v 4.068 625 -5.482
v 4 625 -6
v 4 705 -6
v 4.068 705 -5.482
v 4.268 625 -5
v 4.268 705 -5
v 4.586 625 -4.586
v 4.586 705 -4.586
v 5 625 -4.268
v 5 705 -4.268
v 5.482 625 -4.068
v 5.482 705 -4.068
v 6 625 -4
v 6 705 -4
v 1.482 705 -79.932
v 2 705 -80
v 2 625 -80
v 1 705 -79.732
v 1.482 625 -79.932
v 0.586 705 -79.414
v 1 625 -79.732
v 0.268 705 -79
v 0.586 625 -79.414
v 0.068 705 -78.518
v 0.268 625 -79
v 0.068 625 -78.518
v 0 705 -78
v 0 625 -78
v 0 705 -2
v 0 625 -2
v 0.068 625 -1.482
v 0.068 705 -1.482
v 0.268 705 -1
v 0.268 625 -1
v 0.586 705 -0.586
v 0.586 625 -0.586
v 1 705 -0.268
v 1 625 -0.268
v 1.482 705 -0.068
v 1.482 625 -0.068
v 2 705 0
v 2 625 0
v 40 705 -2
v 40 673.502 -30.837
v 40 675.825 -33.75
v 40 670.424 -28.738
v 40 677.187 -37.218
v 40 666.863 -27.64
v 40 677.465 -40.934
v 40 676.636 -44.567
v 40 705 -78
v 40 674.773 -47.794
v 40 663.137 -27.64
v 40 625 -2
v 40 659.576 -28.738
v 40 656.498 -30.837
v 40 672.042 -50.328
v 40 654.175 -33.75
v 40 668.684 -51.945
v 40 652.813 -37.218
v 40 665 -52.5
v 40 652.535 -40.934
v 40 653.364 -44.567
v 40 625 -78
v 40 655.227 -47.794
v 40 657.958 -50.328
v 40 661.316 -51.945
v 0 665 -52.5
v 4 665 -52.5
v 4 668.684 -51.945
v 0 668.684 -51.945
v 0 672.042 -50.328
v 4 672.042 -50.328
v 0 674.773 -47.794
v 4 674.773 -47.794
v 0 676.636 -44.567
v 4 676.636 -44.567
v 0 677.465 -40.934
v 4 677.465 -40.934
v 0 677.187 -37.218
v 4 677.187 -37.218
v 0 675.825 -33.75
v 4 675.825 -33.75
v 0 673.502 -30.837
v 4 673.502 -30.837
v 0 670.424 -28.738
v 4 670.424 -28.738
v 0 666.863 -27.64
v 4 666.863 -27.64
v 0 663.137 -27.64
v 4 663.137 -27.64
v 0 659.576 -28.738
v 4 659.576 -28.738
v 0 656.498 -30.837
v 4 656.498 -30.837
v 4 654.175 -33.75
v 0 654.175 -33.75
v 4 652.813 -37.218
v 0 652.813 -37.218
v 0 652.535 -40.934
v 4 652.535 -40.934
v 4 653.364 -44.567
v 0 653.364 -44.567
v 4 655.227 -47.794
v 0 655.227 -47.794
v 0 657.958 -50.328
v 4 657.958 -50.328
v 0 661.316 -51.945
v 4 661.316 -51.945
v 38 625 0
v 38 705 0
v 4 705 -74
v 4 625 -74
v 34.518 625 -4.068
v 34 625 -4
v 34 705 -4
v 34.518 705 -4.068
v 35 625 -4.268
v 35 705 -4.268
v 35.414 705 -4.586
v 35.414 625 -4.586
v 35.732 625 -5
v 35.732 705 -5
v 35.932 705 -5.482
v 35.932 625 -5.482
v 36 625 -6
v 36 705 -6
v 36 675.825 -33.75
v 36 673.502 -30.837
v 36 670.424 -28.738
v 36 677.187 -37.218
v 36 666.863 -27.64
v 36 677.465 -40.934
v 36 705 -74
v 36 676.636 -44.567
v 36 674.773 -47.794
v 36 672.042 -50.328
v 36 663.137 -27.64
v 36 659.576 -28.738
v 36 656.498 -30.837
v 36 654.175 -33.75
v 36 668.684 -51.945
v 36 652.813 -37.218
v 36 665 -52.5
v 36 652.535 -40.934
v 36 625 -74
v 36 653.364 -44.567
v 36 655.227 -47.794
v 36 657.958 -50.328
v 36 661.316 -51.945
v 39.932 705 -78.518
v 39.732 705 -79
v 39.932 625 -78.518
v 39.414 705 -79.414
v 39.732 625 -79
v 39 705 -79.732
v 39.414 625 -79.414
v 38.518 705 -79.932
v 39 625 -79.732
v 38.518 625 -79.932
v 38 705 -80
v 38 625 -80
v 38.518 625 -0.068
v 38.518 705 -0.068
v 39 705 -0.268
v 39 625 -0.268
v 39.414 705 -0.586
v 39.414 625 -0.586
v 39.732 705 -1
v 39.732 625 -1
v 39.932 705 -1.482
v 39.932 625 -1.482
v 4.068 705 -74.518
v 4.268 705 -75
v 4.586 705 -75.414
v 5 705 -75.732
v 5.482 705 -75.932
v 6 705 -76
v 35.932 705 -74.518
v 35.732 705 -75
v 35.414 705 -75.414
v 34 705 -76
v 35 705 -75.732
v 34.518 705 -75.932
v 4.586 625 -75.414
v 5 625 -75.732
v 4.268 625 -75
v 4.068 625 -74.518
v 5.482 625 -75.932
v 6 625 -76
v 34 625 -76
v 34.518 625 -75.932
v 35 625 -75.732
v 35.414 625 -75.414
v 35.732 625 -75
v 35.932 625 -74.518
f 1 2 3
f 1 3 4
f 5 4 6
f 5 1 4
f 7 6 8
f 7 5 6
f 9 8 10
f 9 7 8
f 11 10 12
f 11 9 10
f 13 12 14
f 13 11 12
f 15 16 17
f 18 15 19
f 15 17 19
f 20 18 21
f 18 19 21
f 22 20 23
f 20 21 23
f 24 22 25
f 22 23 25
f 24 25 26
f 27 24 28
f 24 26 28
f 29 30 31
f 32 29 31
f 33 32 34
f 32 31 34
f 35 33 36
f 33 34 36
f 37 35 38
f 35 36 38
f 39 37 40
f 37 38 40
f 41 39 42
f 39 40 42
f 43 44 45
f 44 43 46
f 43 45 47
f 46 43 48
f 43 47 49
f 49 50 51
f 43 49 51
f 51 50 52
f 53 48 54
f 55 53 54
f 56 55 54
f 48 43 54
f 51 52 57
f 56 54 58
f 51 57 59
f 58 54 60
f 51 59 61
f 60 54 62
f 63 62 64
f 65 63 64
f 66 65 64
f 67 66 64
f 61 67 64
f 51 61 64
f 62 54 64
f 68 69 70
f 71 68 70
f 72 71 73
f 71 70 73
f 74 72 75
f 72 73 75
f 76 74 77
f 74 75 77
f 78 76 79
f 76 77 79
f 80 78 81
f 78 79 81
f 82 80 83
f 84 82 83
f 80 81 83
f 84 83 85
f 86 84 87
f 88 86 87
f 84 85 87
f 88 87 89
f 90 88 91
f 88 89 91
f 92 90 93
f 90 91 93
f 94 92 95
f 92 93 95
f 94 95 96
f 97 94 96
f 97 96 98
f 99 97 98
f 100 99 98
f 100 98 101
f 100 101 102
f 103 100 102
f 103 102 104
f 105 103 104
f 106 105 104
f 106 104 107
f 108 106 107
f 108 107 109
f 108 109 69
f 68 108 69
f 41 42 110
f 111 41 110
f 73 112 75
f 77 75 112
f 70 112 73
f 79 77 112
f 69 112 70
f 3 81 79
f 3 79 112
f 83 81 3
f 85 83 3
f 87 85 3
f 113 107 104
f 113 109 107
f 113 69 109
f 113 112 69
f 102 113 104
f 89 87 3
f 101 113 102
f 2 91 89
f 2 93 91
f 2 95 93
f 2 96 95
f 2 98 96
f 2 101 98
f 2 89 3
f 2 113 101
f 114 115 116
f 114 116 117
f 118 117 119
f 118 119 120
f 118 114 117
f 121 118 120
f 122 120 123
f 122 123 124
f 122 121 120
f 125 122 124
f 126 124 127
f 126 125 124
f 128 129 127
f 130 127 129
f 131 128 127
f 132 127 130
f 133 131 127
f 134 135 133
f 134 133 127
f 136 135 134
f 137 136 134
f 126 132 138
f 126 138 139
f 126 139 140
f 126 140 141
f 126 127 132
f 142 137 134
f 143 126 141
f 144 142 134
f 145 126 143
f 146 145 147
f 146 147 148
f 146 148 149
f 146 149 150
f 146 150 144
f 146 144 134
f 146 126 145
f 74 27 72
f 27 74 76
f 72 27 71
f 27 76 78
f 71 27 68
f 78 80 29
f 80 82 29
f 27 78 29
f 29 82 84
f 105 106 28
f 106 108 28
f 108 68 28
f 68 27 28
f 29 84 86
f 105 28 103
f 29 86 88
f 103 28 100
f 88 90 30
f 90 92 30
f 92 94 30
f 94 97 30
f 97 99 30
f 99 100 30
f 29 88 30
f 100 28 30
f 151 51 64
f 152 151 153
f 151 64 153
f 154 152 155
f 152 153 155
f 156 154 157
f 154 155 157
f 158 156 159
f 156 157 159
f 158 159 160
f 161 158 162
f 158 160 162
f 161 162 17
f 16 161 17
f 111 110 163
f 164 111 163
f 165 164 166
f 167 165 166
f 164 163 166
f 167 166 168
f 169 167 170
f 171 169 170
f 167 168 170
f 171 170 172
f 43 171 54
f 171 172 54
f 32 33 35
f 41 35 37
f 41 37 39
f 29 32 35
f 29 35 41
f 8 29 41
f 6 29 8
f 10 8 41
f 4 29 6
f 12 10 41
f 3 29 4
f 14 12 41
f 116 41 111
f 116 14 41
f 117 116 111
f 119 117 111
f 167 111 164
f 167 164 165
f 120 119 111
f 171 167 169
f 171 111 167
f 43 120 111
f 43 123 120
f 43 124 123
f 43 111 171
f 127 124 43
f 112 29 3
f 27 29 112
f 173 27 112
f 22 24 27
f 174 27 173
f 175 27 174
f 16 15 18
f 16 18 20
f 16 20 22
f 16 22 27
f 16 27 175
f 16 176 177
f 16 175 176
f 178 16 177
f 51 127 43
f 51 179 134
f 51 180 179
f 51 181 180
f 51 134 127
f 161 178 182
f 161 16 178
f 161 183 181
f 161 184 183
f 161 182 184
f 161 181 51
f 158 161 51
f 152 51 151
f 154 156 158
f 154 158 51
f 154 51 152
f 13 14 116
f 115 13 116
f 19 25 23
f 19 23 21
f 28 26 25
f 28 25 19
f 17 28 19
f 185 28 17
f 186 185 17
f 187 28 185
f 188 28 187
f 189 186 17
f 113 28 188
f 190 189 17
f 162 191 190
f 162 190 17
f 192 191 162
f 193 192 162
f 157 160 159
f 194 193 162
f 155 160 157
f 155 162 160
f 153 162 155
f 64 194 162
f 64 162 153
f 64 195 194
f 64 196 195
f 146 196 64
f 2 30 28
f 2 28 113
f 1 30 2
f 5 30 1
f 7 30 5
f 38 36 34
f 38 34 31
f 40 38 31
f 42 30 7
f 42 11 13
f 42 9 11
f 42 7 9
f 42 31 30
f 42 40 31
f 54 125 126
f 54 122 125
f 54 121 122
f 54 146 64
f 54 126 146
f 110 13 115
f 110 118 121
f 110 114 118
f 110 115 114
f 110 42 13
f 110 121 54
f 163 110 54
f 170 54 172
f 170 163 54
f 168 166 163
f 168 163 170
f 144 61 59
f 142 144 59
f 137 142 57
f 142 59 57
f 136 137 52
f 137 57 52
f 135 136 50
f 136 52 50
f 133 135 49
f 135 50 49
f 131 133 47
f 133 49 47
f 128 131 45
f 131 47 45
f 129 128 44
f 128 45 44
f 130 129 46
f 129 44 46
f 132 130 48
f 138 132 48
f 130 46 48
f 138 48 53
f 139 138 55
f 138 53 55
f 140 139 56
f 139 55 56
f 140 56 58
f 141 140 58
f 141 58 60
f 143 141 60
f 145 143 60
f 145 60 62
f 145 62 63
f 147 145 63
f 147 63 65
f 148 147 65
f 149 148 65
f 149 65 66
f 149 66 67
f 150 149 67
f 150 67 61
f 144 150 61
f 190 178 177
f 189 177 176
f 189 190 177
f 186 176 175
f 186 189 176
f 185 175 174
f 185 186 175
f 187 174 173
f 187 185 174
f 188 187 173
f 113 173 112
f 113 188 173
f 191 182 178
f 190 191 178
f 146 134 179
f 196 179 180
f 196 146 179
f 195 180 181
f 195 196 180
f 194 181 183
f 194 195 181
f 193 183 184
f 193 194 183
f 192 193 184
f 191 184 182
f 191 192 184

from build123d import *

# Parameters (mm, degrees)
BOSS_EXTRU_1_DEPTH      = 705
ESQUISSE3_R             = 10.125
ESQUISSE3_R_2           = 12.5
ENL_V_MAT_EXTRU_1_DEPTH = 711.651109899
ESQUISSE4_W             = 618.270478043
ESQUISSE4_H             = 899.840554594
ESQUISSE4_W_2           = 40
ESQUISSE4_H_2           = 80
ENL_V_MAT_EXTRU_2_DEPTH = 711.651109899


with BuildPart() as part:
    # Esquisse2 → Boss.-Extru.1 (new body)
    with BuildSketch(Plane(origin=(0, 0, 0), x_dir=(1, 0, 0), z_dir=(0, 1, 0))):
        with BuildLine():
            Line((2, 0), (38, 0))
            ThreePointArc((38, 0), (39.414213562, 0.585786438), (40, 2))
            Line((40, 2), (40, 78))
            ThreePointArc((40, 78), (39.414213562, 79.414213562), (38, 80))
            Line((38, 80), (2, 80))
            ThreePointArc((2, 80), (0.585786438, 79.414213562), (0, 78))
            Line((0, 78), (0, 2))
            ThreePointArc((0, 2), (0.585786438, 0.585786438), (2, 0))
        make_face()
        with BuildLine():
            Line((6, 4), (34, 4))
            ThreePointArc((34, 4), (35.414213562, 4.585786438), (36, 6))
            Line((36, 6), (36, 74))
            ThreePointArc((36, 74), (35.414213562, 75.414213562), (34, 76))
            Line((34, 76), (6, 76))
            ThreePointArc((6, 76), (4.585786438, 75.414213562), (4, 74))
            Line((4, 74), (4, 6))
            ThreePointArc((4, 6), (4.585786438, 4.585786438), (6, 4))
        make_face(mode=Mode.SUBTRACT)
    extrude(amount=BOSS_EXTRU_1_DEPTH)

    # Esquisse3 → Enlèv. mat.-Extru.1 (cut, through all)
    with BuildSketch(Plane(origin=(40, 0, 0), x_dir=(0, 0, -1), z_dir=(1, 0, 0))):
        with Locations((40, 90)):
            Circle(ESQUISSE3_R)
        with Locations((40, 665)):
            Circle(ESQUISSE3_R_2)
    extrude(amount=-ENL_V_MAT_EXTRU_1_DEPTH, mode=Mode.SUBTRACT)

    # Esquisse4 → Enlèv. mat.-Extru.2 (cut, through all)
    with BuildSketch(Plane.XY):
        with Locations((15.340579257, 415.457209906)):
            Rectangle(ESQUISSE4_W, ESQUISSE4_H)
        with Locations((20, 665)):
            Rectangle(ESQUISSE4_W_2, ESQUISSE4_H_2, mode=Mode.SUBTRACT)
    extrude(amount=-ENL_V_MAT_EXTRU_2_DEPTH, mode=Mode.SUBTRACT)


solid = part.part
